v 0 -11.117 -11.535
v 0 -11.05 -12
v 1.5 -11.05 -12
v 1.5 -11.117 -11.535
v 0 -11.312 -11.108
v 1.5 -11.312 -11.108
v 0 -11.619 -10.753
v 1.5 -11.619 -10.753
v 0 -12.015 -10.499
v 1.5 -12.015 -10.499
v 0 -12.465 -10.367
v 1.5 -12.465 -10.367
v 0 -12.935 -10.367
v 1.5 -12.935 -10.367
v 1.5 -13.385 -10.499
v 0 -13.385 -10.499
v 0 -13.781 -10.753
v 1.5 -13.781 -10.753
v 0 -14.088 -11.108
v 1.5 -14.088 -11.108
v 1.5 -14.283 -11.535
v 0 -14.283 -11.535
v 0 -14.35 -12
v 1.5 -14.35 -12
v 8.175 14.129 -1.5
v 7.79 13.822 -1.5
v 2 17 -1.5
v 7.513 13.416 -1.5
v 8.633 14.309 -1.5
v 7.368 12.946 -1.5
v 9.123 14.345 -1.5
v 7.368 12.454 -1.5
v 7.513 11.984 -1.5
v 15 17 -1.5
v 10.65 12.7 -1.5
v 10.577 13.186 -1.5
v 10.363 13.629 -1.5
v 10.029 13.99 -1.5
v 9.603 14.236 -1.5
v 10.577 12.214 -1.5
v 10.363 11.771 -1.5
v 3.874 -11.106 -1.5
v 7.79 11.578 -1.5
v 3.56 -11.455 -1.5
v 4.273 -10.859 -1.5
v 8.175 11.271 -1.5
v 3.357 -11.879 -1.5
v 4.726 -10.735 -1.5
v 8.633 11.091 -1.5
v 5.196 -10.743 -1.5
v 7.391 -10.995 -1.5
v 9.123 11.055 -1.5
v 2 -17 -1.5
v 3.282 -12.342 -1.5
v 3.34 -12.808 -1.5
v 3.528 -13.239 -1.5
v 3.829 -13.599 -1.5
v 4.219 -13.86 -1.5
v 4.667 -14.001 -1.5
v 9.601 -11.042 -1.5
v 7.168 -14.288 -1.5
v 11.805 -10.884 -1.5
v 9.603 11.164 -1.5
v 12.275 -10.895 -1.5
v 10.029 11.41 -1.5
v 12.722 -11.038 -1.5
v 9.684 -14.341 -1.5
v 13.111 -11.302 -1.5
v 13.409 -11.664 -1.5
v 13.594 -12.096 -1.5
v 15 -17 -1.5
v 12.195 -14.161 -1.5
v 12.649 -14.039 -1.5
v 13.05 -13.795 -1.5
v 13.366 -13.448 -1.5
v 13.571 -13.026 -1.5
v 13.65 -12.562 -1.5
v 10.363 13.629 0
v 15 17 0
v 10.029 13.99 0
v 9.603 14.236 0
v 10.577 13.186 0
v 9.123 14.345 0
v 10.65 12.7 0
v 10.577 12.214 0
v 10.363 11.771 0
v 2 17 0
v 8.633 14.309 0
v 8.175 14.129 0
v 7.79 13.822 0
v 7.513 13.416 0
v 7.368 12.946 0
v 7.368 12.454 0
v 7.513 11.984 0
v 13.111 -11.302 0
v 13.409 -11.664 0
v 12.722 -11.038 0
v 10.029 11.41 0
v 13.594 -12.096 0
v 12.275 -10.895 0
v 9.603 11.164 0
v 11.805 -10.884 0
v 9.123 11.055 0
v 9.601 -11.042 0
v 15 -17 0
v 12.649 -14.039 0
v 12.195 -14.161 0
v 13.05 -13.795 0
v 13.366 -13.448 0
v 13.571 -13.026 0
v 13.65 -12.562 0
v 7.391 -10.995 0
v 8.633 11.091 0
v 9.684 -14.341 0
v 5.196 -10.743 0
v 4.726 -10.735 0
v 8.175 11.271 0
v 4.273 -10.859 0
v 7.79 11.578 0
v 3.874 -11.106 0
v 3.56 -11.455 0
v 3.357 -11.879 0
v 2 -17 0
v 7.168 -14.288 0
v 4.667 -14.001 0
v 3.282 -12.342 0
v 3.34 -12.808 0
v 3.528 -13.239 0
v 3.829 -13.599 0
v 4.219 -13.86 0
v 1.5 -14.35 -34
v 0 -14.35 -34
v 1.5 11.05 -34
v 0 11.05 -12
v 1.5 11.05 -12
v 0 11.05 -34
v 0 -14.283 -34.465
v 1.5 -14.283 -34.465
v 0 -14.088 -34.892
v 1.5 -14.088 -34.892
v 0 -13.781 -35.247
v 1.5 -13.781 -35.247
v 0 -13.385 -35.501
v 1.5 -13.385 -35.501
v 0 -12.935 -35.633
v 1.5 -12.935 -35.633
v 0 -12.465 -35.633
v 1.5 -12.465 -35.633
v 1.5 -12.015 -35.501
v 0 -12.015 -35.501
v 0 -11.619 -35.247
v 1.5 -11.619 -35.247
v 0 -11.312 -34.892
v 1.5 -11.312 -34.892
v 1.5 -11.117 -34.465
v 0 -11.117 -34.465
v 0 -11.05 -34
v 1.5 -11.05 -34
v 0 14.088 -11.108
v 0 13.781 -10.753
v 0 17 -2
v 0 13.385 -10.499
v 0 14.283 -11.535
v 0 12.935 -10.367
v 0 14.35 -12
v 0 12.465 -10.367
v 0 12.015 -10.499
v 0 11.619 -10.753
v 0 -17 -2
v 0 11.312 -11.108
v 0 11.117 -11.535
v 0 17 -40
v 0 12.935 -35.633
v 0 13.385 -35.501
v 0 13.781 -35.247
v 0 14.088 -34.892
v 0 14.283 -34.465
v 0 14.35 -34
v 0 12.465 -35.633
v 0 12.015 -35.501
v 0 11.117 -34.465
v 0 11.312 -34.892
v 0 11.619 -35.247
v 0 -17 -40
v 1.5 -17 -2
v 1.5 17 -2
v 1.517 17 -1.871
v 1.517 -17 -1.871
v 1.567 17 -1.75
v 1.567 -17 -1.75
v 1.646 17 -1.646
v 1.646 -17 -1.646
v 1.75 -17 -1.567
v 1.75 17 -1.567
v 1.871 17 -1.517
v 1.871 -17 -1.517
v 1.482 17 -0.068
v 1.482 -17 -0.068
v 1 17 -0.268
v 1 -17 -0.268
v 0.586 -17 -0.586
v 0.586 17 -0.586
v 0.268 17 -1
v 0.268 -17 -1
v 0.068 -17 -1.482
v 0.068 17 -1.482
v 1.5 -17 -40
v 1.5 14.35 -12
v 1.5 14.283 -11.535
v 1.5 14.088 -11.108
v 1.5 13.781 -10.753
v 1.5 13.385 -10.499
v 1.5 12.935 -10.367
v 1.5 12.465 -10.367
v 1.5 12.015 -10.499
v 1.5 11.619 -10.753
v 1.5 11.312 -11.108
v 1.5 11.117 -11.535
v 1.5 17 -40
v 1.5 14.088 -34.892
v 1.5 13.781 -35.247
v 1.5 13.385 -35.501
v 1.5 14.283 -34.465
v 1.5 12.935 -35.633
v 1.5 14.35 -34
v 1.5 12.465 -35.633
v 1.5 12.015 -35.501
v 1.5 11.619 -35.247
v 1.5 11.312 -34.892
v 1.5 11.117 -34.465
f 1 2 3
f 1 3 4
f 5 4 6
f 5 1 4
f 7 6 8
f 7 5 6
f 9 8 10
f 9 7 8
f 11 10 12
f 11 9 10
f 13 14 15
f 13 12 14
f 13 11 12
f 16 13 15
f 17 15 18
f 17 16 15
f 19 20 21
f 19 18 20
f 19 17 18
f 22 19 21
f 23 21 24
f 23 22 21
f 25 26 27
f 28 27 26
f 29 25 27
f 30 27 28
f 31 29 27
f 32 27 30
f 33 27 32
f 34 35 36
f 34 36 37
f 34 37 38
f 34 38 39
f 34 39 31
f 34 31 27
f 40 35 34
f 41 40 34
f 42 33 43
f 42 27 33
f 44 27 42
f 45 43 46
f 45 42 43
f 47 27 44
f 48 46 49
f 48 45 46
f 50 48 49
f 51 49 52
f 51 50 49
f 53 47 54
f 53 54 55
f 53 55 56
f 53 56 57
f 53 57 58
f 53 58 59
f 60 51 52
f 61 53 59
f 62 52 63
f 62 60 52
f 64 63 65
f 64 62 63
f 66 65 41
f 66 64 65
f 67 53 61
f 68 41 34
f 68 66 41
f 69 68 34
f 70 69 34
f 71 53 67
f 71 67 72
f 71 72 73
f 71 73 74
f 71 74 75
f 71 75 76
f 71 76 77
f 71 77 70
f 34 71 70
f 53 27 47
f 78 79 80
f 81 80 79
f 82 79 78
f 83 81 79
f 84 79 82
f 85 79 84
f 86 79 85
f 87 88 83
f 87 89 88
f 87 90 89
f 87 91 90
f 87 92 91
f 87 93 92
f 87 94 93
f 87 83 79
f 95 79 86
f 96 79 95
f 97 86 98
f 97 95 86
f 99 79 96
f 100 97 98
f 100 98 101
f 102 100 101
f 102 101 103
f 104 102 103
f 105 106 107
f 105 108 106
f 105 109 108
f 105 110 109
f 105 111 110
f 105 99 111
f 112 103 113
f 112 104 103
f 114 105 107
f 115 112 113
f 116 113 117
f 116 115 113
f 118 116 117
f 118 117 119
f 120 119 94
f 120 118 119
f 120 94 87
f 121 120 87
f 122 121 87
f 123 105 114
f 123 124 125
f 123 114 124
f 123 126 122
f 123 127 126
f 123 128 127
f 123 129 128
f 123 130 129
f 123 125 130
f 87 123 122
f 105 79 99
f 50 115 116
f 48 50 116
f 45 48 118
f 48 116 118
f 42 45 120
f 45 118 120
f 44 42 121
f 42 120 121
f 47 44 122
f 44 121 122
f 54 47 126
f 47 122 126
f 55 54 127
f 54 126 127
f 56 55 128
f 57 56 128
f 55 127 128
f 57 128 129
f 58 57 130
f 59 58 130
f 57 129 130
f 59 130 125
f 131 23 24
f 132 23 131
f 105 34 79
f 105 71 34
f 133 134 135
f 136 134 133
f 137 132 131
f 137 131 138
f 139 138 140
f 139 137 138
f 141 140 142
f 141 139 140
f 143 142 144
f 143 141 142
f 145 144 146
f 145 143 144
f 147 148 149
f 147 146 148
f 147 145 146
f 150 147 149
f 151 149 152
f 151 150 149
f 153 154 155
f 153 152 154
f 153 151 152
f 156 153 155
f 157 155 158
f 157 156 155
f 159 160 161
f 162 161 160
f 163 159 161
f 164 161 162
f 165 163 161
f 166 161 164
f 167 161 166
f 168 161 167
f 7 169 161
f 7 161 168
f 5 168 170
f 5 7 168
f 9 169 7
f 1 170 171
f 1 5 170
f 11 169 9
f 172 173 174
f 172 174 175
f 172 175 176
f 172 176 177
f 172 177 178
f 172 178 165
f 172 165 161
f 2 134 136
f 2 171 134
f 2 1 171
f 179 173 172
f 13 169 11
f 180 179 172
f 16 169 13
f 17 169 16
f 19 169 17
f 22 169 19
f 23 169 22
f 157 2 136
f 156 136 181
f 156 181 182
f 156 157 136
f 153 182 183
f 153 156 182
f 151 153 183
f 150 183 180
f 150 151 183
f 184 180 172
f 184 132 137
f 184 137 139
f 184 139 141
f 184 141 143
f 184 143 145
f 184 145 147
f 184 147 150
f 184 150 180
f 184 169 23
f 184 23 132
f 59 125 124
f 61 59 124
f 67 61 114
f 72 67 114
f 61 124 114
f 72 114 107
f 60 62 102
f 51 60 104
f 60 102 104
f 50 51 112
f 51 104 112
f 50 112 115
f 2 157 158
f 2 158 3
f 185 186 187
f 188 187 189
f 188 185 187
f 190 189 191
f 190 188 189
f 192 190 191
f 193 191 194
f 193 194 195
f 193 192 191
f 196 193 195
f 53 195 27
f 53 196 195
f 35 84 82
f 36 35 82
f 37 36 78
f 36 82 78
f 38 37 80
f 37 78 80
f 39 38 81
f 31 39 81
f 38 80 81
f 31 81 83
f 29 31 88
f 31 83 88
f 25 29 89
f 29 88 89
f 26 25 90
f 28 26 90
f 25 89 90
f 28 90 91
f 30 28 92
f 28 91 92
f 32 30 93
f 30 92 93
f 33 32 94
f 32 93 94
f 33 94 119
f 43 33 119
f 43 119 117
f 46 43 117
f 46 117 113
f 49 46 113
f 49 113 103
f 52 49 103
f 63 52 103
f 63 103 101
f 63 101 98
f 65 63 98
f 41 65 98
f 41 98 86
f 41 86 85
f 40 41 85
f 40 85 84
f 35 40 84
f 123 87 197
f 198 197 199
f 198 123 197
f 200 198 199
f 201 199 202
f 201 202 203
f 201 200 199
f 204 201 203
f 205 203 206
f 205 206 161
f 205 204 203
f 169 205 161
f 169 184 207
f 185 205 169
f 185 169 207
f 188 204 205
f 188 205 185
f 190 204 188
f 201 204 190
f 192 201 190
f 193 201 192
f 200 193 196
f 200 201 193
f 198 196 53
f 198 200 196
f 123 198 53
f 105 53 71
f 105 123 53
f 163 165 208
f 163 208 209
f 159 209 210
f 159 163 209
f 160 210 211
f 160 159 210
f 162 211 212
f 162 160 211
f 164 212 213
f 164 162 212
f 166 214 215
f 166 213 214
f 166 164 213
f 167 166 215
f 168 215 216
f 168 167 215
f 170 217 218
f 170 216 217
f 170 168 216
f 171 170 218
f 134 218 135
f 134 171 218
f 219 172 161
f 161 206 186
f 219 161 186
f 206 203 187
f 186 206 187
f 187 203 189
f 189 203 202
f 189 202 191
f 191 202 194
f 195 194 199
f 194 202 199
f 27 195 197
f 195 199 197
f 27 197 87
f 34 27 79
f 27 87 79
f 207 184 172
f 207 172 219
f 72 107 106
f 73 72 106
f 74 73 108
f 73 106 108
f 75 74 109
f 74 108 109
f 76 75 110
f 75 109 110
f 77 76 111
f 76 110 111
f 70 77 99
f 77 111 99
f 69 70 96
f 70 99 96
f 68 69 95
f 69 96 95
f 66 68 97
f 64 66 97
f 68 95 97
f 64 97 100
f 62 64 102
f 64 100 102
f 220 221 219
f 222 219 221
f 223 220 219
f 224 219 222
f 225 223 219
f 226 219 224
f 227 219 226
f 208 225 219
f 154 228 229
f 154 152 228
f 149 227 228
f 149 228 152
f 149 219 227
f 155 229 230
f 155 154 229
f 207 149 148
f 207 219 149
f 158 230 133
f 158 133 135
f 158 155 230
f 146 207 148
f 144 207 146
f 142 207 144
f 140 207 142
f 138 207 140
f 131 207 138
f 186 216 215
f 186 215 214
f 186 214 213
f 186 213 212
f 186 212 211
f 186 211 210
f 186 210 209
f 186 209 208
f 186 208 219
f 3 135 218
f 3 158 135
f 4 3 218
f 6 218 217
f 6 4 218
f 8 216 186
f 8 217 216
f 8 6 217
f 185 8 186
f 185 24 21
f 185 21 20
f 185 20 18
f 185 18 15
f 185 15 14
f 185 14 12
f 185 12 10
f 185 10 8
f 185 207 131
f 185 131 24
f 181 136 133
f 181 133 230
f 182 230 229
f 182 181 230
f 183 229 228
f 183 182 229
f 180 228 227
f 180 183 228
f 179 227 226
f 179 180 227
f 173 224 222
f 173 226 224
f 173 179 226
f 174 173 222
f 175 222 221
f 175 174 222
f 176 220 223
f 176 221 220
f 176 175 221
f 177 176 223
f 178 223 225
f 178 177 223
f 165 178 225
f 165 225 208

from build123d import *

# Parameters (mm, degrees)
F1_DEPTH = 17
F2_R     = 1.65
F3_DEPTH = 40.001
F5_DEPTH = 15.001


with BuildPart() as f1:
    # F0 (on Front) → F1 (new body, symmetric)
    with BuildSketch(Plane.XZ):
        with BuildLine():
            Line((15, 0), (2, 0))
            ThreePointArc((2, 0), (0.585786, -0.585786), (0, -2))
            Line((0, -2), (0, -40))
            Line((0, -40), (1.5, -40))
            Line((1.5, -40), (1.5, -2))
            ThreePointArc((1.5, -2), (1.646447, -1.646447), (2, -1.5))
            Line((2, -1.5), (15, -1.5))
            Line((15, -1.5), (15, 0))
        make_face()
    extrude(amount=F1_DEPTH, both=True)

    # F2 (on Top) → F3 (cut, through all)
    with BuildSketch(Plane.XY):
        with BuildLine():
            ThreePointArc((12.194882, -14.160663), (13.638451, -12.327331), (11.805118, -10.883762))
            ThreePointArc((11.805118, -10.883762), (8.495594, -11.044643), (5.195887, -10.743362))
            ThreePointArc((5.195887, -10.743362), (3.302904, -12.107773), (4.667315, -14.000755))
            ThreePointArc((4.667315, -14.000755), (8.425508, -14.343899), (12.194882, -14.160663))
        make_face()
        with Locations((9, 12.7)):
            Circle(F2_R)
    extrude(amount=-F3_DEPTH, mode=Mode.SUBTRACT)

    # F4 (on Right) → F5 (cut, through all)
    with BuildSketch(Plane.YZ):
        with BuildLine():
            ThreePointArc((11.05, -34), (12.7, -35.65), (14.35, -34))
            Line((14.35, -34), (14.35, -12))
            ThreePointArc((14.35, -12), (12.7, -10.35), (11.05, -12))
            Line((11.05, -12), (11.05, -34))
        make_face()
        with BuildLine():
            ThreePointArc((-14.35, -34), (-12.7, -35.65), (-11.05, -34))
            Line((-11.05, -34), (-11.05, -12))
            ThreePointArc((-11.05, -12), (-12.7, -10.35), (-14.35, -12))
            Line((-14.35, -12), (-14.35, -34))
        make_face()
    extrude(amount=F5_DEPTH, mode=Mode.SUBTRACT)


solid = f1.part
